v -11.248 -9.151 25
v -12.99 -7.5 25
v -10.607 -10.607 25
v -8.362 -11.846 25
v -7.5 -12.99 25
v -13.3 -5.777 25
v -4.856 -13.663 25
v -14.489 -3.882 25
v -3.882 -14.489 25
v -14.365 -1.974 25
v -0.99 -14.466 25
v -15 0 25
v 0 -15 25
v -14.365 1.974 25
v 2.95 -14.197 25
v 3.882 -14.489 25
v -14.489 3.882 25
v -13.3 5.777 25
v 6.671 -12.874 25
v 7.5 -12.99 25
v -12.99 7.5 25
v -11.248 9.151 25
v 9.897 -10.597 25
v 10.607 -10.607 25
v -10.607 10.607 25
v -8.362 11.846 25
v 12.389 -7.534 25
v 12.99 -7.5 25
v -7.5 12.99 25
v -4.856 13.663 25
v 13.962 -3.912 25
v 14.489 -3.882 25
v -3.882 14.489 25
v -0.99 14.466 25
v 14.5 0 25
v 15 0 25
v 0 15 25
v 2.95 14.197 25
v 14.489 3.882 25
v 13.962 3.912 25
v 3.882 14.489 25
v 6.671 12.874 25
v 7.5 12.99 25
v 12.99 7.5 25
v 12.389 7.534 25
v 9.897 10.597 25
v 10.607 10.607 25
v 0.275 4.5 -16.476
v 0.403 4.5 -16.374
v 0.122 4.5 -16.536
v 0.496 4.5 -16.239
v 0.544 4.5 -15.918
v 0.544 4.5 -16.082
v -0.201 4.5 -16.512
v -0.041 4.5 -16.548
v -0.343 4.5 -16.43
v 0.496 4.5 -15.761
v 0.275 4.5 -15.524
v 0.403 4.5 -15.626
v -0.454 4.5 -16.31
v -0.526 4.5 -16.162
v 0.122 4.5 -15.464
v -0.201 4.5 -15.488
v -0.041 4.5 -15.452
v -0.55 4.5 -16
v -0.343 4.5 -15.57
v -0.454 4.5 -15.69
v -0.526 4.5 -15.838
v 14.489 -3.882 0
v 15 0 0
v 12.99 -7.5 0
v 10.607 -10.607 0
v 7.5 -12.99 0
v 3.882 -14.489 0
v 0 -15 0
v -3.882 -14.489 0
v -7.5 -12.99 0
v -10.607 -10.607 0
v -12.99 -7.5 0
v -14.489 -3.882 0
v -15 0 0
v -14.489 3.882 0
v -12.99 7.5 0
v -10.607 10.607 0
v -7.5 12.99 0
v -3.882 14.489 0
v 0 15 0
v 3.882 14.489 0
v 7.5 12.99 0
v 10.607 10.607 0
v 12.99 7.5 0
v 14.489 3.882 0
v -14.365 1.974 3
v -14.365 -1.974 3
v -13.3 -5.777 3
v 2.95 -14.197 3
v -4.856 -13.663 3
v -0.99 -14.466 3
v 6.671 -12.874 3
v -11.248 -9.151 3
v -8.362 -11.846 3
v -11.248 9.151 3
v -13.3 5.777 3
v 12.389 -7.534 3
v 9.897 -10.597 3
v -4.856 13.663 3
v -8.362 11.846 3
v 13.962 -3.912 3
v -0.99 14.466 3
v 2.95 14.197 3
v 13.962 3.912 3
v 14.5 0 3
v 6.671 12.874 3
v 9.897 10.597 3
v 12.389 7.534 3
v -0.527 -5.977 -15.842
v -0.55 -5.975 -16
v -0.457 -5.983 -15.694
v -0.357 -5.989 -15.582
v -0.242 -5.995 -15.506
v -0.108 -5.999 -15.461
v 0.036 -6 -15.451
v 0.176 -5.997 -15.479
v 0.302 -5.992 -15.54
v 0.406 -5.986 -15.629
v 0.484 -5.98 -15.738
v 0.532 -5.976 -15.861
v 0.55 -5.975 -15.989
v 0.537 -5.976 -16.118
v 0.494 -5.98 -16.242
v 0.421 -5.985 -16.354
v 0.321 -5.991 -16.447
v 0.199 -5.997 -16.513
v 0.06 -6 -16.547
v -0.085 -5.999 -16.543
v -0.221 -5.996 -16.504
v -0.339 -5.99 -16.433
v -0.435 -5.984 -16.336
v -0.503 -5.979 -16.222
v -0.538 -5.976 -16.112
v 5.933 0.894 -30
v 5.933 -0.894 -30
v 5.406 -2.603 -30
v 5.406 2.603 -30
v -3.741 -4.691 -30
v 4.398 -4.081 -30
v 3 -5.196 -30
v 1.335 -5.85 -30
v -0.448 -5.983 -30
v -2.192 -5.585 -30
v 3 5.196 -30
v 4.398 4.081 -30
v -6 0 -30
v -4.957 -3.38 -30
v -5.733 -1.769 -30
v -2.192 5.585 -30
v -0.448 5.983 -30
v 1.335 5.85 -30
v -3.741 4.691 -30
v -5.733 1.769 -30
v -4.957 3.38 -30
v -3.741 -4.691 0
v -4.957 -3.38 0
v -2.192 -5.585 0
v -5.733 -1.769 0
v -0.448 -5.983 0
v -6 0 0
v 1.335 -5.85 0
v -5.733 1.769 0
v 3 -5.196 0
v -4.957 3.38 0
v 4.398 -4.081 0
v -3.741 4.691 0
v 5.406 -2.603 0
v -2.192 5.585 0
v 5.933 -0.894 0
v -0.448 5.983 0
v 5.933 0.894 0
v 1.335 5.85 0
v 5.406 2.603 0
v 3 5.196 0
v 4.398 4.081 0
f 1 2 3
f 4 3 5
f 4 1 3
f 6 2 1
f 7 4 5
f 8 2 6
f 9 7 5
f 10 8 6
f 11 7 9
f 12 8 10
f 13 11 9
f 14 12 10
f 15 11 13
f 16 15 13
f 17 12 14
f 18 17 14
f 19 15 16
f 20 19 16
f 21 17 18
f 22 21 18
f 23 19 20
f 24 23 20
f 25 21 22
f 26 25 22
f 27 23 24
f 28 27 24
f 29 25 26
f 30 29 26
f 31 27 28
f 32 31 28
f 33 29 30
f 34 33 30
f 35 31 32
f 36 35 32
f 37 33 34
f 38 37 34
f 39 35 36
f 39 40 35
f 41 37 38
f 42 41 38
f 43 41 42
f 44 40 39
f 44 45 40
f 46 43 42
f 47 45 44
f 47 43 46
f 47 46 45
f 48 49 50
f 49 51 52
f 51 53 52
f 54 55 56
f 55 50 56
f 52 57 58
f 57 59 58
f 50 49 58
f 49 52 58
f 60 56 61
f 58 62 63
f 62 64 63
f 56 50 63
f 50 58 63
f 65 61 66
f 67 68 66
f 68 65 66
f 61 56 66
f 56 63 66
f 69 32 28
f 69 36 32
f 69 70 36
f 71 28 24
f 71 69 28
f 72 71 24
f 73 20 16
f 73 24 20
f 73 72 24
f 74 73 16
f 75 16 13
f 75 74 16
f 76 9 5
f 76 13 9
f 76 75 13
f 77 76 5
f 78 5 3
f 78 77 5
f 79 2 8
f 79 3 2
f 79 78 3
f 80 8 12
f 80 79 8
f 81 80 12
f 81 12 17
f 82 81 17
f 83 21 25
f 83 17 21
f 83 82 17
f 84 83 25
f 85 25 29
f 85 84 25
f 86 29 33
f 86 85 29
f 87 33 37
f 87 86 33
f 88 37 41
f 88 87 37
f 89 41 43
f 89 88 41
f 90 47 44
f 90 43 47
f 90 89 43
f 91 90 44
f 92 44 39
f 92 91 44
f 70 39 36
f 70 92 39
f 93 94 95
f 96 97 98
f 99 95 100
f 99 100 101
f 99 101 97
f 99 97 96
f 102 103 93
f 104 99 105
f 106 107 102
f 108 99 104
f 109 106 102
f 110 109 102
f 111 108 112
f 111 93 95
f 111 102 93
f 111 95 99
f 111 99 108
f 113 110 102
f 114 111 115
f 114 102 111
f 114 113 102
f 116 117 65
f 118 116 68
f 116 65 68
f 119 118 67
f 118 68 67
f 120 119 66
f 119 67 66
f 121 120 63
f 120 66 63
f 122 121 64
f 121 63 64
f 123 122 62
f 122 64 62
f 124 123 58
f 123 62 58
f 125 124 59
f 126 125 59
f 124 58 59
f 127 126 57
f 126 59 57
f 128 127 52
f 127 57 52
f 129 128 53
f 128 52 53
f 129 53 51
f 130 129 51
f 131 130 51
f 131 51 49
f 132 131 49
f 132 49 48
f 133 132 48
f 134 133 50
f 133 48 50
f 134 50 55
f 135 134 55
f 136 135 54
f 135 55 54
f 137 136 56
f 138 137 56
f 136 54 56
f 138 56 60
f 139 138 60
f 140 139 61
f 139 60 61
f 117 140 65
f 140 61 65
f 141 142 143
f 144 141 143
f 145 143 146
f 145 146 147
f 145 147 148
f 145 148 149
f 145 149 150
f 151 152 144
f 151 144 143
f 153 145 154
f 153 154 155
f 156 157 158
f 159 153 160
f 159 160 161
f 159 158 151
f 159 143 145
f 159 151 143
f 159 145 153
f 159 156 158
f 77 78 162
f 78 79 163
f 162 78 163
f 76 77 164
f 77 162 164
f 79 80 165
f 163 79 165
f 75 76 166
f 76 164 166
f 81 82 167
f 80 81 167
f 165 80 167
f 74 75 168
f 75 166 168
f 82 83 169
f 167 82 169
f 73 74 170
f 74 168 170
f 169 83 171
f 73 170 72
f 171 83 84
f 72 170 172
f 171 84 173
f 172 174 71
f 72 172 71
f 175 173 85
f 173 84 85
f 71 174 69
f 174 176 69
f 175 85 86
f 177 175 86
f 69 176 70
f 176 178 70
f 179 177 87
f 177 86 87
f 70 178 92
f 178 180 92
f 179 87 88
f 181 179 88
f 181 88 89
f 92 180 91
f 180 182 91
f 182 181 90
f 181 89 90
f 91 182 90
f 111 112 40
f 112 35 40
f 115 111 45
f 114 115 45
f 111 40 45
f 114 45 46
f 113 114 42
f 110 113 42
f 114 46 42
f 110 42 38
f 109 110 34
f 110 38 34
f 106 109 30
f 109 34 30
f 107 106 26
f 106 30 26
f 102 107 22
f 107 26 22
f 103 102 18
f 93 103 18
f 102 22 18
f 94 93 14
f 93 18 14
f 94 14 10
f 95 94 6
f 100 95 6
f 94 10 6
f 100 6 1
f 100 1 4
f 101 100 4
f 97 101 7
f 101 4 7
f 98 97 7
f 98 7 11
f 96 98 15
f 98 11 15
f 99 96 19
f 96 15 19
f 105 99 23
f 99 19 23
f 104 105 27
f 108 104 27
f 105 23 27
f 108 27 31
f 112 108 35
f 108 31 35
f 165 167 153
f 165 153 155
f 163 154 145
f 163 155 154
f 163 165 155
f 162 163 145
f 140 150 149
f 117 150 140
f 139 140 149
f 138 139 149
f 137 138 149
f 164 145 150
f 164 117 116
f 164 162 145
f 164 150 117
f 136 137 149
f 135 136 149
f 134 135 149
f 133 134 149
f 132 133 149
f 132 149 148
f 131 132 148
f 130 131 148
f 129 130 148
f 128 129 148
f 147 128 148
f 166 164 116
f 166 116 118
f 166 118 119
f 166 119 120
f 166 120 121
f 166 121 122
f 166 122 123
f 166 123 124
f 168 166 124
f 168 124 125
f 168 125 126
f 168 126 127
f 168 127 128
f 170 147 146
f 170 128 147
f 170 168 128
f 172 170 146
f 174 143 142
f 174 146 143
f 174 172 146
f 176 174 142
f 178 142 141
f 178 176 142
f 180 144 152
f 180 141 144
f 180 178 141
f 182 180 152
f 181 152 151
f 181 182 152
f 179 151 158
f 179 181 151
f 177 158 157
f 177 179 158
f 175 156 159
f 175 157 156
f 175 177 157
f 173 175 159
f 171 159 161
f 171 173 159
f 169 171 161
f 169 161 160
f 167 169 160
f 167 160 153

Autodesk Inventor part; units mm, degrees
ref_plane "YZ Plane" through (0, 0, 0) normal (1, 0, 0) x (0, 1, 0)
ref_plane "XZ Plane" through (0, 0, 0) normal (0, 1, 0) x (-1, 0, 0)
ref_plane "XY Plane" through (0, 0, 0) normal (0, 0, 1) x (1, 0, 0)
sketch "Sketch1" plane through (0, 0, 0) normal (0, 0, 1) x (1, 0, 0)
  circle A0 centre (0, 0) radius 15
  dimension "d0" = 30
extrude "Extrusion1" add sketch "Sketch1" along normal blind 25
sketch "Sketch2" plane through (0, 0, 25) normal (0, 0, 1) x (1, 0, 0)
  circle A0 centre (0, 0) radius 14.5
  dimension "d3" = 29
extrude "Extrusion2" cut sketch "Sketch2" along normal blind 22
sketch "Sketch3" plane through (0, 0, 25) normal (0, 0, 1) x (1, 0, 0)
  circle A0 centre (0, 0) radius 14.5
  dimension "d6" = 29
extrude "Extrusion3" cut sketch "Sketch3" against normal blind 22
thread "Thread1" size "M30x3.5" class "6H" standard "ANSI Metric M Profile" full length
sketch "Sketch4" plane through (0, 0, 0) normal (0, 0, -1) x (-1, 0, 0)
  circle A0 centre (0, 0) radius 6
  circle A1 centre (0, 0) radius 5
  dimension "d24" = 12
  dimension "d25" = 10
extrude "Extrusion4" add sketch "Sketch4" along normal blind 30 contours A0 | A1
sketch "Sketch5" plane through (0, 0, -30) normal (0, 0, -1) x (-1, 0, 0)
  point P0 (0, 0)
sketch "Sketch6" plane through (0, 0, 0) normal (0, 1, 0) x (-1, 0, 0)
  line L0 (-3.5, -20) -> (3.5, -20) projected
  line L1 (0, -20) -> (0, -16)
  circle A0 centre (0, -16) radius 0.55
  point P0 (0, 0)
  dimension "d14" = 4
  dimension "d15" = 1.1
extrude "Extrusion5" cut sketch "Sketch6" against normal blind 9 and the other way blind 4.5
sketch "Sketch7" plane through (0, 0, -30) normal (0, 0, -1) x (-1, 0, 0)
  point P0 (0, 0)
extrude "Extrusion6" [suppressed]
properties part number "CAPPER"
